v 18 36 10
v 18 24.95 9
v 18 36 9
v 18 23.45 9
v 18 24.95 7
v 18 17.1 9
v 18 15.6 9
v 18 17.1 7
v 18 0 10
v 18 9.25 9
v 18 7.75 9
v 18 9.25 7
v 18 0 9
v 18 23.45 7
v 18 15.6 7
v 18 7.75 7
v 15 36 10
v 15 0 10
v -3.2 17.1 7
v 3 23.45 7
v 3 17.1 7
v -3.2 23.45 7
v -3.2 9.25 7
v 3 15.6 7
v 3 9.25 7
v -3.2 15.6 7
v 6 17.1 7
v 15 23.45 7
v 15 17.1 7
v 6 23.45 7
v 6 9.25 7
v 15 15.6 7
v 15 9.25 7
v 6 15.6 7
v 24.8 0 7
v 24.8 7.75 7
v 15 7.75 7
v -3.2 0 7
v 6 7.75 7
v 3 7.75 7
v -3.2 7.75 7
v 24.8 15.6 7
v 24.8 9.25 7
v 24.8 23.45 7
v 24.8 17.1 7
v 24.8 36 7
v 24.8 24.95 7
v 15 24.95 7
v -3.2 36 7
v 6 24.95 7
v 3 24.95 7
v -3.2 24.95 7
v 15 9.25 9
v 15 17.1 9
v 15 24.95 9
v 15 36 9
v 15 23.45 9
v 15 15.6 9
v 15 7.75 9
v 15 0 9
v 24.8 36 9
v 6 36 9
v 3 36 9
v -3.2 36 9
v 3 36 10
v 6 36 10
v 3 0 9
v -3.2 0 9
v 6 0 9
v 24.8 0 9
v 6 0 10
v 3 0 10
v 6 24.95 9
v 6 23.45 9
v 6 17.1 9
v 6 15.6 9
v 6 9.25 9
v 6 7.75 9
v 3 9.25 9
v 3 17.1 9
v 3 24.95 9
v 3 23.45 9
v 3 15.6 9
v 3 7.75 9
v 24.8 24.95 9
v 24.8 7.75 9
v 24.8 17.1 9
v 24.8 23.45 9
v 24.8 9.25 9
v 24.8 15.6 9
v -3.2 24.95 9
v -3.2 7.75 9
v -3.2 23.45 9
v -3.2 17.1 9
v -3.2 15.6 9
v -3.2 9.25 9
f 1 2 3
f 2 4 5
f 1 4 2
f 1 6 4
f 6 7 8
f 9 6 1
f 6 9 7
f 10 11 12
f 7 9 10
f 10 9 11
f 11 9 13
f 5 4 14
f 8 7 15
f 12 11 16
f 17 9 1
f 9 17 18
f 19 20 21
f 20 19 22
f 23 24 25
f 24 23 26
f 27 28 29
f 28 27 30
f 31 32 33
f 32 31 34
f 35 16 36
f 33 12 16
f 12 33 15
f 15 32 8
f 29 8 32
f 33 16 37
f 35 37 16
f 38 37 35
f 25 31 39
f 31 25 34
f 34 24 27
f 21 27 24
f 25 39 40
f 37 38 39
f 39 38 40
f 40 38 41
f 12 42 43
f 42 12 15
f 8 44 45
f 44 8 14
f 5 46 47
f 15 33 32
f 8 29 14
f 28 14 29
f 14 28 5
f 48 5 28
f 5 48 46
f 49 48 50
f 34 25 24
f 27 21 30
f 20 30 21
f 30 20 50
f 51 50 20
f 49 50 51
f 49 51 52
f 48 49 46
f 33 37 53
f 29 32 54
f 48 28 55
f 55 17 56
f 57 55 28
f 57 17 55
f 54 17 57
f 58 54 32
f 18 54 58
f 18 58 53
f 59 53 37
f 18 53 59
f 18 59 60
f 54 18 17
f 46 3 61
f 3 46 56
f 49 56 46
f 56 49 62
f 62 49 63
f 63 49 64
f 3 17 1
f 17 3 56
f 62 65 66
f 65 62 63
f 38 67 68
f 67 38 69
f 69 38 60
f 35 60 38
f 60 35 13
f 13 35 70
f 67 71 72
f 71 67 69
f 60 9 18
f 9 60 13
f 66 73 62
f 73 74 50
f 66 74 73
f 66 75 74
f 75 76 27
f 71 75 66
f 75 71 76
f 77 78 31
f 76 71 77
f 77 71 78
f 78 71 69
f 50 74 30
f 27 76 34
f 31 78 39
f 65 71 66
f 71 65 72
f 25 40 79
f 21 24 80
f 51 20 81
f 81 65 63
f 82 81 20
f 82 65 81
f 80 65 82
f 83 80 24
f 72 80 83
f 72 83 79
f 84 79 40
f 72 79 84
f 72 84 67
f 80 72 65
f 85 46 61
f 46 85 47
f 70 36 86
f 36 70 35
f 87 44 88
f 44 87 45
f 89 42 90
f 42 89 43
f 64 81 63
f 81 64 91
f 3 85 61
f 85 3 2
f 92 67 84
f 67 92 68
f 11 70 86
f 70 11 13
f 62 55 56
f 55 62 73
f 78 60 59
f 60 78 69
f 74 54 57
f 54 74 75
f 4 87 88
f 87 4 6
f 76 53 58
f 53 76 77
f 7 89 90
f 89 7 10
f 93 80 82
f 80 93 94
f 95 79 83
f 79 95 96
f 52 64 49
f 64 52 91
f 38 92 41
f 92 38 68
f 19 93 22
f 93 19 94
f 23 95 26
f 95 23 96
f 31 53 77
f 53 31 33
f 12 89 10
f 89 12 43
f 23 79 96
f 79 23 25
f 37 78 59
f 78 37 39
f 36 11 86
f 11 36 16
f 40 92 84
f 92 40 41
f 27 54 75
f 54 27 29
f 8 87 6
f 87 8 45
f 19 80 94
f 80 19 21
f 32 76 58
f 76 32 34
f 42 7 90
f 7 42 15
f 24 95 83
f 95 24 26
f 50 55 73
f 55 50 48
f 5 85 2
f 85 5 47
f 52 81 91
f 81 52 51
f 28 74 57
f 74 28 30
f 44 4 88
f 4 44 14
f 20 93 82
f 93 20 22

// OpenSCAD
$fn = 100; 



//dash(); 
translate ([0, 0, 0]) difference() {
    front();
    dash();
}

module front() {
    translate ([15, 0, 7]) cube([3, 36, 3]);
    translate ([3, 0, 7]) cube([3, 36, 3]);
    translate ([-3.2, 0, 7]) cube([28, 36, 2]);
    
}
 
module dash() {
    translate([2, 2, 0]) cylinder(2, 2, 2); 
    translate([22, 2, 0]) cylinder(2, 2, 2);
    translate([2, 34, 0]) cylinder(2, 2, 2);
    translate([22, 34, 0]) cylinder(2, 2, 2);

    difference () {
        assembled_dividers();
        translate ([15, 0, 6]) cube([3, 50, 3]);
        translate ([3, 0, 6]) cube([3, 50, 3]);
    
    }
    difference () {
        cube([24, 36, 2]);
        translate([8.75, 2, -0.1]) cube([6, 6, 2.2]);
        translate([8.75, 10, -0.1]) cube([6, 6, 2.2]);
        translate([8.75, 18, -0.1]) cube([6, 6, 2.2]);
        translate([0, 0, -0.1]) cube([2, 2, 2.2]);
        translate([22, 0, -0.1]) cube([2, 2, 2.2]);
        translate([0, 34, -0.1]) cube([2, 2, 2.2]);
        translate([22, 34, -0.1]) cube([2, 2, 2.2]);    

    }

    module assembled_dividers () {
        translate ([-3.7, 7.75, 2]) divider();
        translate ([-3.7, 15.6, 2]) divider();
        translate ([-3.7, 23.45, 2]) divider();
    }

    module divider () {
        difference () {
            cube([29, 1.5, 7]);
            translate([27.25, -2, -2.5]) rotate([0, 10, 0]) cube([10, 10, 10]);
            translate([-8.5, -2, -2.5]) rotate([0, 350, 0]) cube([10, 10, 10]);
	
        }
    }
}
